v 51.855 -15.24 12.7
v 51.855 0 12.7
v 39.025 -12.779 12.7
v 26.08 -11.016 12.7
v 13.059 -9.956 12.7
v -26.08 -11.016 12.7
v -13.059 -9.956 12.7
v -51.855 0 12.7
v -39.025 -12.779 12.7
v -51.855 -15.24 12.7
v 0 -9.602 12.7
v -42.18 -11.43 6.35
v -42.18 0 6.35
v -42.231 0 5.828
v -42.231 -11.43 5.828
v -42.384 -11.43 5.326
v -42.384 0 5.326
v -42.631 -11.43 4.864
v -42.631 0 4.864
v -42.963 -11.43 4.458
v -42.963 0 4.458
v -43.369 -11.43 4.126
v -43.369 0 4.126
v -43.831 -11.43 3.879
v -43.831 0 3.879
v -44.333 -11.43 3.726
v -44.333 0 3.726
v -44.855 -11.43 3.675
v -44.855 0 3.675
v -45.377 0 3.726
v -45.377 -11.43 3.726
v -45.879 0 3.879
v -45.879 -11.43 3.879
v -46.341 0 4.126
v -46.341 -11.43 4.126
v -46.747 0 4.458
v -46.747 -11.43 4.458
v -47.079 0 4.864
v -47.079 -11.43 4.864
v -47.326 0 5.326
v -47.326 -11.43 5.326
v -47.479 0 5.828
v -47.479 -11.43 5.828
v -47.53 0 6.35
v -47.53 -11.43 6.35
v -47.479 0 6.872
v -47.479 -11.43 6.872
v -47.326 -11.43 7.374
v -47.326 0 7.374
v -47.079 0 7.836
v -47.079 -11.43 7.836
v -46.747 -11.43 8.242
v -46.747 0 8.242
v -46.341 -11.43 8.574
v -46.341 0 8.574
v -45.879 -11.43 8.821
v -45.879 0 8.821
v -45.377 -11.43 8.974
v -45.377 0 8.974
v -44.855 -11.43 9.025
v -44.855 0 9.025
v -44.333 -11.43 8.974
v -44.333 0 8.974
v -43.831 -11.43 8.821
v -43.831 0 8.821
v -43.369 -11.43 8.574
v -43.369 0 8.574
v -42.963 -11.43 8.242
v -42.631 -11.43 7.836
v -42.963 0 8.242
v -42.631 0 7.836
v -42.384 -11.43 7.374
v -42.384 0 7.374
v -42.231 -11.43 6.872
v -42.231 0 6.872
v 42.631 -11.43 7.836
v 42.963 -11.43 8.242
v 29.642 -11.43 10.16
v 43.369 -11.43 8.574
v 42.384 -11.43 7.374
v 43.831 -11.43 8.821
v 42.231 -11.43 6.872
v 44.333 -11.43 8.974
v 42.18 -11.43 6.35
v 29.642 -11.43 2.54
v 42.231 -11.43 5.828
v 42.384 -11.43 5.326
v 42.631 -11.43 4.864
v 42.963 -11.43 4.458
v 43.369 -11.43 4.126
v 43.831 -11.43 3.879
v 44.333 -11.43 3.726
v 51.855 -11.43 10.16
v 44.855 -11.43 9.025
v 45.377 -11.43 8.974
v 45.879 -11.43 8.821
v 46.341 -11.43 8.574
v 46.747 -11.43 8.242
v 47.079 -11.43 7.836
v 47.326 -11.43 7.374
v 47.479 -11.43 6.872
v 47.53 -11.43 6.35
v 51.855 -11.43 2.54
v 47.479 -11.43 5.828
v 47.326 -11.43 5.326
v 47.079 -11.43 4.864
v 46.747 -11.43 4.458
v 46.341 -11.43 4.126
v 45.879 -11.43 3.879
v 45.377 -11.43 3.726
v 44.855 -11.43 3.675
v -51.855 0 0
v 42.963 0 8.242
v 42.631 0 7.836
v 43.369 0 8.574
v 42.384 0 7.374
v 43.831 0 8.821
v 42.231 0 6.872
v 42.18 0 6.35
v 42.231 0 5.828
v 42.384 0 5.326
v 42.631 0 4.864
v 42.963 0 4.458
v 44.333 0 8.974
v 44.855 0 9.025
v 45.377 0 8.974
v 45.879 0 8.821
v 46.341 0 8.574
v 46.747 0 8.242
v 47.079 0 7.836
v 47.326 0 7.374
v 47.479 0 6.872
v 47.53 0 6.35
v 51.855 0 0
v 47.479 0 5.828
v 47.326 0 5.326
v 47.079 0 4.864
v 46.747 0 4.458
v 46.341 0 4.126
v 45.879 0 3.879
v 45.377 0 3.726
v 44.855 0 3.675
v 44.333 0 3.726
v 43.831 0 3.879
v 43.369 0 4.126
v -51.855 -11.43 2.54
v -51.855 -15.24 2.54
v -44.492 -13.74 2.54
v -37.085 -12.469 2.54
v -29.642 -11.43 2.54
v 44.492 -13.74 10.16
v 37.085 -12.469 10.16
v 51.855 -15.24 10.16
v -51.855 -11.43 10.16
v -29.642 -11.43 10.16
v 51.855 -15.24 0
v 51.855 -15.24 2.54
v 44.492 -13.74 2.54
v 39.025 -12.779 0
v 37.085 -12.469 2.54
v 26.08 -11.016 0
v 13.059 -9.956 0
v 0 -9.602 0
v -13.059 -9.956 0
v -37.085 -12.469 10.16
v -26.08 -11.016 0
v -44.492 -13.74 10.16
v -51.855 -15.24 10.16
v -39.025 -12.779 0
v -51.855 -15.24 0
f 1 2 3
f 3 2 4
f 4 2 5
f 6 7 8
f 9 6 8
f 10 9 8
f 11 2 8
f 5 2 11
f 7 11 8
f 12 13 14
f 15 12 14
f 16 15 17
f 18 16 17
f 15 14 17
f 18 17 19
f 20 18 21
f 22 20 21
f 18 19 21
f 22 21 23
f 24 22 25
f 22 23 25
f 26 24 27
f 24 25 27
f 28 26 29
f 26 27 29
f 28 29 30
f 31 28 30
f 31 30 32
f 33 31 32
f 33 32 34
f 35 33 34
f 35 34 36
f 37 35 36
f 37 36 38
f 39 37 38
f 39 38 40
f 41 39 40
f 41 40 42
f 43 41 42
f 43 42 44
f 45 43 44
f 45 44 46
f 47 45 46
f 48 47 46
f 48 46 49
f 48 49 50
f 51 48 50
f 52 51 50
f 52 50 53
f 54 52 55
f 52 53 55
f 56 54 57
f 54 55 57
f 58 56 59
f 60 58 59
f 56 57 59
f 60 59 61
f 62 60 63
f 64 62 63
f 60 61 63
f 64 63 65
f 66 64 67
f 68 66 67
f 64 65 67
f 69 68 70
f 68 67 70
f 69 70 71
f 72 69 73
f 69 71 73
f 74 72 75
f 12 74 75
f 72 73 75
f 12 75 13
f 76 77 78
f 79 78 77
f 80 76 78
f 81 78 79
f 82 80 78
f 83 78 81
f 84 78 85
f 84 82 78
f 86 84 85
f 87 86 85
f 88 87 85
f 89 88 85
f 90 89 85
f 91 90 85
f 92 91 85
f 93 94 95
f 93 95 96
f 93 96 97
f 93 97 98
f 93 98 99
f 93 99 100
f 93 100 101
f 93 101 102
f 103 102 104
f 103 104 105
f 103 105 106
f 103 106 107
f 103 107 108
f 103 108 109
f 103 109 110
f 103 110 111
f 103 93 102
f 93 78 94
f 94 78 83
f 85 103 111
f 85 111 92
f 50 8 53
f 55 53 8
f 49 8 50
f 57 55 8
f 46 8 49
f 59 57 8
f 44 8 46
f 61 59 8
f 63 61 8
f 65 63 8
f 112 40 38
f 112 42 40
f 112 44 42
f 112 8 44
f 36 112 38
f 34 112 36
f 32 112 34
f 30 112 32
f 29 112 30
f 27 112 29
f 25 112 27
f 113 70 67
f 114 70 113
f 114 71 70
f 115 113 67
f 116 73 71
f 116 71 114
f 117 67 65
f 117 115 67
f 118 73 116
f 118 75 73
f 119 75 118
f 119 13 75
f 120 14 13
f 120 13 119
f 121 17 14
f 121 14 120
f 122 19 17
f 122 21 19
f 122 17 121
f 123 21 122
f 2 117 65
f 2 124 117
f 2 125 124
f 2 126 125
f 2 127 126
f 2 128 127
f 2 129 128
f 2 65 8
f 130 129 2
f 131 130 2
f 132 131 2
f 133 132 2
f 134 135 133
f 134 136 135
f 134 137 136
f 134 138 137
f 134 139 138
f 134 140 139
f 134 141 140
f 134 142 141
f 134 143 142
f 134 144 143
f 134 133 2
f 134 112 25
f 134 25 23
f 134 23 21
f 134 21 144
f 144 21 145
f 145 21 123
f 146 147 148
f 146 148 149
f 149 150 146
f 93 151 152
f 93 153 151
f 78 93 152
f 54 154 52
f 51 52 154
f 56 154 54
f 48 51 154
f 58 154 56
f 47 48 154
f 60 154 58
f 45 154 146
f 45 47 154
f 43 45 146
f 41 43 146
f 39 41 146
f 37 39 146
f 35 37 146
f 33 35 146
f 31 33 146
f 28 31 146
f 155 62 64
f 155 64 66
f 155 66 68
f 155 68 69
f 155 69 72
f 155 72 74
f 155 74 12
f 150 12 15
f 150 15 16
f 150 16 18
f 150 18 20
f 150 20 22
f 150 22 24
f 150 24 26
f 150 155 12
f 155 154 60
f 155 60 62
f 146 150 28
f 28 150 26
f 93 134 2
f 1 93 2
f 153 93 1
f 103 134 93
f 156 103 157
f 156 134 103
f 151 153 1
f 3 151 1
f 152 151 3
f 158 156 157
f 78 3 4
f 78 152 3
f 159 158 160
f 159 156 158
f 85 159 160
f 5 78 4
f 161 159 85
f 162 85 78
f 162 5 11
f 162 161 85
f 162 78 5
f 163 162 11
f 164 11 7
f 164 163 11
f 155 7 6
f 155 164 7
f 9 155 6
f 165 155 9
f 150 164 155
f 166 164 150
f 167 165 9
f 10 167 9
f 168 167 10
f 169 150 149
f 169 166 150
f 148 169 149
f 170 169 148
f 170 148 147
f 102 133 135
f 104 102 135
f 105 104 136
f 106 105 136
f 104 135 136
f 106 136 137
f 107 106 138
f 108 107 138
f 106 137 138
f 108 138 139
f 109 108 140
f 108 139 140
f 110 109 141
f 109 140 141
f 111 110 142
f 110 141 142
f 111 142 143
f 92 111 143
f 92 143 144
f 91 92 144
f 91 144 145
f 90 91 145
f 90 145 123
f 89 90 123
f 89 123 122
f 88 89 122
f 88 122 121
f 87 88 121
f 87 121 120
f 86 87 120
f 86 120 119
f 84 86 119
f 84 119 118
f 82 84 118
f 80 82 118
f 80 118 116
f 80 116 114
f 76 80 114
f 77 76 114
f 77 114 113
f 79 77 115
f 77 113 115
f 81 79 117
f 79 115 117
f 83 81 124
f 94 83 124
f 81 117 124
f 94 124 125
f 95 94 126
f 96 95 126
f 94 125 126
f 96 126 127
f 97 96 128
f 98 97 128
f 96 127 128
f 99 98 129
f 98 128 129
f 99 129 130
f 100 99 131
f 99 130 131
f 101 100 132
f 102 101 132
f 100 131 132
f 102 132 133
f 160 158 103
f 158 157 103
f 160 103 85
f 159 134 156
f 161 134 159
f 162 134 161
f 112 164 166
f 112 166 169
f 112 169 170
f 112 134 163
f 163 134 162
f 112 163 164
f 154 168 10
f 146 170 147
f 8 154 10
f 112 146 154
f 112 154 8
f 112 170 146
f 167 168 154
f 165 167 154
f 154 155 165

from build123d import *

# Parameters (mm, degrees)
BOSS_EXTRUDE1_DEPTH = 12.7
SKETCH2_R           = 2.675
CUT_EXTRUDE1_DEPTH  = 16.24
SKETCH3_W           = 7.62
SKETCH3_H           = 3.81
CUT_EXTRUDE2_DEPTH  = 104.7100001


with BuildPart() as part:
    # Sketch1 → Boss-Extrude1 (new body)
    with BuildSketch(Plane.XY):
        with BuildLine():
            Line((-51.855, 0), (51.855, 0))
            Line((51.855, 0), (51.855, -15.24))
            ThreePointArc((51.855, -15.24), (0, -9.602362237), (-51.855, -15.24))
            Line((-51.855, -15.24), (-51.855, 0))
        make_face()
    extrude(amount=BOSS_EXTRUDE1_DEPTH)

    # Sketch2 → Cut-Extrude1 (cut, through all)
    with BuildSketch(Plane(origin=(0, 0, 0), x_dir=(1, 0, 0), z_dir=(0, 1, 0))):
        with Locations((-44.855, -6.35)):
            Circle(SKETCH2_R)
        with Locations((44.855, -6.35)):
            Circle(SKETCH2_R)
    extrude(amount=-CUT_EXTRUDE1_DEPTH, mode=Mode.SUBTRACT)

    # Sketch3 → Cut-Extrude2 (cut, through all)
    with BuildSketch(Plane(origin=(51.855, 0, 0), x_dir=(0, 0, -1), z_dir=(1, 0, 0))):
        with Locations((-6.35, -13.335)):
            Rectangle(SKETCH3_W, SKETCH3_H)
    extrude(amount=-CUT_EXTRUDE2_DEPTH, mode=Mode.SUBTRACT)


solid = part.part
